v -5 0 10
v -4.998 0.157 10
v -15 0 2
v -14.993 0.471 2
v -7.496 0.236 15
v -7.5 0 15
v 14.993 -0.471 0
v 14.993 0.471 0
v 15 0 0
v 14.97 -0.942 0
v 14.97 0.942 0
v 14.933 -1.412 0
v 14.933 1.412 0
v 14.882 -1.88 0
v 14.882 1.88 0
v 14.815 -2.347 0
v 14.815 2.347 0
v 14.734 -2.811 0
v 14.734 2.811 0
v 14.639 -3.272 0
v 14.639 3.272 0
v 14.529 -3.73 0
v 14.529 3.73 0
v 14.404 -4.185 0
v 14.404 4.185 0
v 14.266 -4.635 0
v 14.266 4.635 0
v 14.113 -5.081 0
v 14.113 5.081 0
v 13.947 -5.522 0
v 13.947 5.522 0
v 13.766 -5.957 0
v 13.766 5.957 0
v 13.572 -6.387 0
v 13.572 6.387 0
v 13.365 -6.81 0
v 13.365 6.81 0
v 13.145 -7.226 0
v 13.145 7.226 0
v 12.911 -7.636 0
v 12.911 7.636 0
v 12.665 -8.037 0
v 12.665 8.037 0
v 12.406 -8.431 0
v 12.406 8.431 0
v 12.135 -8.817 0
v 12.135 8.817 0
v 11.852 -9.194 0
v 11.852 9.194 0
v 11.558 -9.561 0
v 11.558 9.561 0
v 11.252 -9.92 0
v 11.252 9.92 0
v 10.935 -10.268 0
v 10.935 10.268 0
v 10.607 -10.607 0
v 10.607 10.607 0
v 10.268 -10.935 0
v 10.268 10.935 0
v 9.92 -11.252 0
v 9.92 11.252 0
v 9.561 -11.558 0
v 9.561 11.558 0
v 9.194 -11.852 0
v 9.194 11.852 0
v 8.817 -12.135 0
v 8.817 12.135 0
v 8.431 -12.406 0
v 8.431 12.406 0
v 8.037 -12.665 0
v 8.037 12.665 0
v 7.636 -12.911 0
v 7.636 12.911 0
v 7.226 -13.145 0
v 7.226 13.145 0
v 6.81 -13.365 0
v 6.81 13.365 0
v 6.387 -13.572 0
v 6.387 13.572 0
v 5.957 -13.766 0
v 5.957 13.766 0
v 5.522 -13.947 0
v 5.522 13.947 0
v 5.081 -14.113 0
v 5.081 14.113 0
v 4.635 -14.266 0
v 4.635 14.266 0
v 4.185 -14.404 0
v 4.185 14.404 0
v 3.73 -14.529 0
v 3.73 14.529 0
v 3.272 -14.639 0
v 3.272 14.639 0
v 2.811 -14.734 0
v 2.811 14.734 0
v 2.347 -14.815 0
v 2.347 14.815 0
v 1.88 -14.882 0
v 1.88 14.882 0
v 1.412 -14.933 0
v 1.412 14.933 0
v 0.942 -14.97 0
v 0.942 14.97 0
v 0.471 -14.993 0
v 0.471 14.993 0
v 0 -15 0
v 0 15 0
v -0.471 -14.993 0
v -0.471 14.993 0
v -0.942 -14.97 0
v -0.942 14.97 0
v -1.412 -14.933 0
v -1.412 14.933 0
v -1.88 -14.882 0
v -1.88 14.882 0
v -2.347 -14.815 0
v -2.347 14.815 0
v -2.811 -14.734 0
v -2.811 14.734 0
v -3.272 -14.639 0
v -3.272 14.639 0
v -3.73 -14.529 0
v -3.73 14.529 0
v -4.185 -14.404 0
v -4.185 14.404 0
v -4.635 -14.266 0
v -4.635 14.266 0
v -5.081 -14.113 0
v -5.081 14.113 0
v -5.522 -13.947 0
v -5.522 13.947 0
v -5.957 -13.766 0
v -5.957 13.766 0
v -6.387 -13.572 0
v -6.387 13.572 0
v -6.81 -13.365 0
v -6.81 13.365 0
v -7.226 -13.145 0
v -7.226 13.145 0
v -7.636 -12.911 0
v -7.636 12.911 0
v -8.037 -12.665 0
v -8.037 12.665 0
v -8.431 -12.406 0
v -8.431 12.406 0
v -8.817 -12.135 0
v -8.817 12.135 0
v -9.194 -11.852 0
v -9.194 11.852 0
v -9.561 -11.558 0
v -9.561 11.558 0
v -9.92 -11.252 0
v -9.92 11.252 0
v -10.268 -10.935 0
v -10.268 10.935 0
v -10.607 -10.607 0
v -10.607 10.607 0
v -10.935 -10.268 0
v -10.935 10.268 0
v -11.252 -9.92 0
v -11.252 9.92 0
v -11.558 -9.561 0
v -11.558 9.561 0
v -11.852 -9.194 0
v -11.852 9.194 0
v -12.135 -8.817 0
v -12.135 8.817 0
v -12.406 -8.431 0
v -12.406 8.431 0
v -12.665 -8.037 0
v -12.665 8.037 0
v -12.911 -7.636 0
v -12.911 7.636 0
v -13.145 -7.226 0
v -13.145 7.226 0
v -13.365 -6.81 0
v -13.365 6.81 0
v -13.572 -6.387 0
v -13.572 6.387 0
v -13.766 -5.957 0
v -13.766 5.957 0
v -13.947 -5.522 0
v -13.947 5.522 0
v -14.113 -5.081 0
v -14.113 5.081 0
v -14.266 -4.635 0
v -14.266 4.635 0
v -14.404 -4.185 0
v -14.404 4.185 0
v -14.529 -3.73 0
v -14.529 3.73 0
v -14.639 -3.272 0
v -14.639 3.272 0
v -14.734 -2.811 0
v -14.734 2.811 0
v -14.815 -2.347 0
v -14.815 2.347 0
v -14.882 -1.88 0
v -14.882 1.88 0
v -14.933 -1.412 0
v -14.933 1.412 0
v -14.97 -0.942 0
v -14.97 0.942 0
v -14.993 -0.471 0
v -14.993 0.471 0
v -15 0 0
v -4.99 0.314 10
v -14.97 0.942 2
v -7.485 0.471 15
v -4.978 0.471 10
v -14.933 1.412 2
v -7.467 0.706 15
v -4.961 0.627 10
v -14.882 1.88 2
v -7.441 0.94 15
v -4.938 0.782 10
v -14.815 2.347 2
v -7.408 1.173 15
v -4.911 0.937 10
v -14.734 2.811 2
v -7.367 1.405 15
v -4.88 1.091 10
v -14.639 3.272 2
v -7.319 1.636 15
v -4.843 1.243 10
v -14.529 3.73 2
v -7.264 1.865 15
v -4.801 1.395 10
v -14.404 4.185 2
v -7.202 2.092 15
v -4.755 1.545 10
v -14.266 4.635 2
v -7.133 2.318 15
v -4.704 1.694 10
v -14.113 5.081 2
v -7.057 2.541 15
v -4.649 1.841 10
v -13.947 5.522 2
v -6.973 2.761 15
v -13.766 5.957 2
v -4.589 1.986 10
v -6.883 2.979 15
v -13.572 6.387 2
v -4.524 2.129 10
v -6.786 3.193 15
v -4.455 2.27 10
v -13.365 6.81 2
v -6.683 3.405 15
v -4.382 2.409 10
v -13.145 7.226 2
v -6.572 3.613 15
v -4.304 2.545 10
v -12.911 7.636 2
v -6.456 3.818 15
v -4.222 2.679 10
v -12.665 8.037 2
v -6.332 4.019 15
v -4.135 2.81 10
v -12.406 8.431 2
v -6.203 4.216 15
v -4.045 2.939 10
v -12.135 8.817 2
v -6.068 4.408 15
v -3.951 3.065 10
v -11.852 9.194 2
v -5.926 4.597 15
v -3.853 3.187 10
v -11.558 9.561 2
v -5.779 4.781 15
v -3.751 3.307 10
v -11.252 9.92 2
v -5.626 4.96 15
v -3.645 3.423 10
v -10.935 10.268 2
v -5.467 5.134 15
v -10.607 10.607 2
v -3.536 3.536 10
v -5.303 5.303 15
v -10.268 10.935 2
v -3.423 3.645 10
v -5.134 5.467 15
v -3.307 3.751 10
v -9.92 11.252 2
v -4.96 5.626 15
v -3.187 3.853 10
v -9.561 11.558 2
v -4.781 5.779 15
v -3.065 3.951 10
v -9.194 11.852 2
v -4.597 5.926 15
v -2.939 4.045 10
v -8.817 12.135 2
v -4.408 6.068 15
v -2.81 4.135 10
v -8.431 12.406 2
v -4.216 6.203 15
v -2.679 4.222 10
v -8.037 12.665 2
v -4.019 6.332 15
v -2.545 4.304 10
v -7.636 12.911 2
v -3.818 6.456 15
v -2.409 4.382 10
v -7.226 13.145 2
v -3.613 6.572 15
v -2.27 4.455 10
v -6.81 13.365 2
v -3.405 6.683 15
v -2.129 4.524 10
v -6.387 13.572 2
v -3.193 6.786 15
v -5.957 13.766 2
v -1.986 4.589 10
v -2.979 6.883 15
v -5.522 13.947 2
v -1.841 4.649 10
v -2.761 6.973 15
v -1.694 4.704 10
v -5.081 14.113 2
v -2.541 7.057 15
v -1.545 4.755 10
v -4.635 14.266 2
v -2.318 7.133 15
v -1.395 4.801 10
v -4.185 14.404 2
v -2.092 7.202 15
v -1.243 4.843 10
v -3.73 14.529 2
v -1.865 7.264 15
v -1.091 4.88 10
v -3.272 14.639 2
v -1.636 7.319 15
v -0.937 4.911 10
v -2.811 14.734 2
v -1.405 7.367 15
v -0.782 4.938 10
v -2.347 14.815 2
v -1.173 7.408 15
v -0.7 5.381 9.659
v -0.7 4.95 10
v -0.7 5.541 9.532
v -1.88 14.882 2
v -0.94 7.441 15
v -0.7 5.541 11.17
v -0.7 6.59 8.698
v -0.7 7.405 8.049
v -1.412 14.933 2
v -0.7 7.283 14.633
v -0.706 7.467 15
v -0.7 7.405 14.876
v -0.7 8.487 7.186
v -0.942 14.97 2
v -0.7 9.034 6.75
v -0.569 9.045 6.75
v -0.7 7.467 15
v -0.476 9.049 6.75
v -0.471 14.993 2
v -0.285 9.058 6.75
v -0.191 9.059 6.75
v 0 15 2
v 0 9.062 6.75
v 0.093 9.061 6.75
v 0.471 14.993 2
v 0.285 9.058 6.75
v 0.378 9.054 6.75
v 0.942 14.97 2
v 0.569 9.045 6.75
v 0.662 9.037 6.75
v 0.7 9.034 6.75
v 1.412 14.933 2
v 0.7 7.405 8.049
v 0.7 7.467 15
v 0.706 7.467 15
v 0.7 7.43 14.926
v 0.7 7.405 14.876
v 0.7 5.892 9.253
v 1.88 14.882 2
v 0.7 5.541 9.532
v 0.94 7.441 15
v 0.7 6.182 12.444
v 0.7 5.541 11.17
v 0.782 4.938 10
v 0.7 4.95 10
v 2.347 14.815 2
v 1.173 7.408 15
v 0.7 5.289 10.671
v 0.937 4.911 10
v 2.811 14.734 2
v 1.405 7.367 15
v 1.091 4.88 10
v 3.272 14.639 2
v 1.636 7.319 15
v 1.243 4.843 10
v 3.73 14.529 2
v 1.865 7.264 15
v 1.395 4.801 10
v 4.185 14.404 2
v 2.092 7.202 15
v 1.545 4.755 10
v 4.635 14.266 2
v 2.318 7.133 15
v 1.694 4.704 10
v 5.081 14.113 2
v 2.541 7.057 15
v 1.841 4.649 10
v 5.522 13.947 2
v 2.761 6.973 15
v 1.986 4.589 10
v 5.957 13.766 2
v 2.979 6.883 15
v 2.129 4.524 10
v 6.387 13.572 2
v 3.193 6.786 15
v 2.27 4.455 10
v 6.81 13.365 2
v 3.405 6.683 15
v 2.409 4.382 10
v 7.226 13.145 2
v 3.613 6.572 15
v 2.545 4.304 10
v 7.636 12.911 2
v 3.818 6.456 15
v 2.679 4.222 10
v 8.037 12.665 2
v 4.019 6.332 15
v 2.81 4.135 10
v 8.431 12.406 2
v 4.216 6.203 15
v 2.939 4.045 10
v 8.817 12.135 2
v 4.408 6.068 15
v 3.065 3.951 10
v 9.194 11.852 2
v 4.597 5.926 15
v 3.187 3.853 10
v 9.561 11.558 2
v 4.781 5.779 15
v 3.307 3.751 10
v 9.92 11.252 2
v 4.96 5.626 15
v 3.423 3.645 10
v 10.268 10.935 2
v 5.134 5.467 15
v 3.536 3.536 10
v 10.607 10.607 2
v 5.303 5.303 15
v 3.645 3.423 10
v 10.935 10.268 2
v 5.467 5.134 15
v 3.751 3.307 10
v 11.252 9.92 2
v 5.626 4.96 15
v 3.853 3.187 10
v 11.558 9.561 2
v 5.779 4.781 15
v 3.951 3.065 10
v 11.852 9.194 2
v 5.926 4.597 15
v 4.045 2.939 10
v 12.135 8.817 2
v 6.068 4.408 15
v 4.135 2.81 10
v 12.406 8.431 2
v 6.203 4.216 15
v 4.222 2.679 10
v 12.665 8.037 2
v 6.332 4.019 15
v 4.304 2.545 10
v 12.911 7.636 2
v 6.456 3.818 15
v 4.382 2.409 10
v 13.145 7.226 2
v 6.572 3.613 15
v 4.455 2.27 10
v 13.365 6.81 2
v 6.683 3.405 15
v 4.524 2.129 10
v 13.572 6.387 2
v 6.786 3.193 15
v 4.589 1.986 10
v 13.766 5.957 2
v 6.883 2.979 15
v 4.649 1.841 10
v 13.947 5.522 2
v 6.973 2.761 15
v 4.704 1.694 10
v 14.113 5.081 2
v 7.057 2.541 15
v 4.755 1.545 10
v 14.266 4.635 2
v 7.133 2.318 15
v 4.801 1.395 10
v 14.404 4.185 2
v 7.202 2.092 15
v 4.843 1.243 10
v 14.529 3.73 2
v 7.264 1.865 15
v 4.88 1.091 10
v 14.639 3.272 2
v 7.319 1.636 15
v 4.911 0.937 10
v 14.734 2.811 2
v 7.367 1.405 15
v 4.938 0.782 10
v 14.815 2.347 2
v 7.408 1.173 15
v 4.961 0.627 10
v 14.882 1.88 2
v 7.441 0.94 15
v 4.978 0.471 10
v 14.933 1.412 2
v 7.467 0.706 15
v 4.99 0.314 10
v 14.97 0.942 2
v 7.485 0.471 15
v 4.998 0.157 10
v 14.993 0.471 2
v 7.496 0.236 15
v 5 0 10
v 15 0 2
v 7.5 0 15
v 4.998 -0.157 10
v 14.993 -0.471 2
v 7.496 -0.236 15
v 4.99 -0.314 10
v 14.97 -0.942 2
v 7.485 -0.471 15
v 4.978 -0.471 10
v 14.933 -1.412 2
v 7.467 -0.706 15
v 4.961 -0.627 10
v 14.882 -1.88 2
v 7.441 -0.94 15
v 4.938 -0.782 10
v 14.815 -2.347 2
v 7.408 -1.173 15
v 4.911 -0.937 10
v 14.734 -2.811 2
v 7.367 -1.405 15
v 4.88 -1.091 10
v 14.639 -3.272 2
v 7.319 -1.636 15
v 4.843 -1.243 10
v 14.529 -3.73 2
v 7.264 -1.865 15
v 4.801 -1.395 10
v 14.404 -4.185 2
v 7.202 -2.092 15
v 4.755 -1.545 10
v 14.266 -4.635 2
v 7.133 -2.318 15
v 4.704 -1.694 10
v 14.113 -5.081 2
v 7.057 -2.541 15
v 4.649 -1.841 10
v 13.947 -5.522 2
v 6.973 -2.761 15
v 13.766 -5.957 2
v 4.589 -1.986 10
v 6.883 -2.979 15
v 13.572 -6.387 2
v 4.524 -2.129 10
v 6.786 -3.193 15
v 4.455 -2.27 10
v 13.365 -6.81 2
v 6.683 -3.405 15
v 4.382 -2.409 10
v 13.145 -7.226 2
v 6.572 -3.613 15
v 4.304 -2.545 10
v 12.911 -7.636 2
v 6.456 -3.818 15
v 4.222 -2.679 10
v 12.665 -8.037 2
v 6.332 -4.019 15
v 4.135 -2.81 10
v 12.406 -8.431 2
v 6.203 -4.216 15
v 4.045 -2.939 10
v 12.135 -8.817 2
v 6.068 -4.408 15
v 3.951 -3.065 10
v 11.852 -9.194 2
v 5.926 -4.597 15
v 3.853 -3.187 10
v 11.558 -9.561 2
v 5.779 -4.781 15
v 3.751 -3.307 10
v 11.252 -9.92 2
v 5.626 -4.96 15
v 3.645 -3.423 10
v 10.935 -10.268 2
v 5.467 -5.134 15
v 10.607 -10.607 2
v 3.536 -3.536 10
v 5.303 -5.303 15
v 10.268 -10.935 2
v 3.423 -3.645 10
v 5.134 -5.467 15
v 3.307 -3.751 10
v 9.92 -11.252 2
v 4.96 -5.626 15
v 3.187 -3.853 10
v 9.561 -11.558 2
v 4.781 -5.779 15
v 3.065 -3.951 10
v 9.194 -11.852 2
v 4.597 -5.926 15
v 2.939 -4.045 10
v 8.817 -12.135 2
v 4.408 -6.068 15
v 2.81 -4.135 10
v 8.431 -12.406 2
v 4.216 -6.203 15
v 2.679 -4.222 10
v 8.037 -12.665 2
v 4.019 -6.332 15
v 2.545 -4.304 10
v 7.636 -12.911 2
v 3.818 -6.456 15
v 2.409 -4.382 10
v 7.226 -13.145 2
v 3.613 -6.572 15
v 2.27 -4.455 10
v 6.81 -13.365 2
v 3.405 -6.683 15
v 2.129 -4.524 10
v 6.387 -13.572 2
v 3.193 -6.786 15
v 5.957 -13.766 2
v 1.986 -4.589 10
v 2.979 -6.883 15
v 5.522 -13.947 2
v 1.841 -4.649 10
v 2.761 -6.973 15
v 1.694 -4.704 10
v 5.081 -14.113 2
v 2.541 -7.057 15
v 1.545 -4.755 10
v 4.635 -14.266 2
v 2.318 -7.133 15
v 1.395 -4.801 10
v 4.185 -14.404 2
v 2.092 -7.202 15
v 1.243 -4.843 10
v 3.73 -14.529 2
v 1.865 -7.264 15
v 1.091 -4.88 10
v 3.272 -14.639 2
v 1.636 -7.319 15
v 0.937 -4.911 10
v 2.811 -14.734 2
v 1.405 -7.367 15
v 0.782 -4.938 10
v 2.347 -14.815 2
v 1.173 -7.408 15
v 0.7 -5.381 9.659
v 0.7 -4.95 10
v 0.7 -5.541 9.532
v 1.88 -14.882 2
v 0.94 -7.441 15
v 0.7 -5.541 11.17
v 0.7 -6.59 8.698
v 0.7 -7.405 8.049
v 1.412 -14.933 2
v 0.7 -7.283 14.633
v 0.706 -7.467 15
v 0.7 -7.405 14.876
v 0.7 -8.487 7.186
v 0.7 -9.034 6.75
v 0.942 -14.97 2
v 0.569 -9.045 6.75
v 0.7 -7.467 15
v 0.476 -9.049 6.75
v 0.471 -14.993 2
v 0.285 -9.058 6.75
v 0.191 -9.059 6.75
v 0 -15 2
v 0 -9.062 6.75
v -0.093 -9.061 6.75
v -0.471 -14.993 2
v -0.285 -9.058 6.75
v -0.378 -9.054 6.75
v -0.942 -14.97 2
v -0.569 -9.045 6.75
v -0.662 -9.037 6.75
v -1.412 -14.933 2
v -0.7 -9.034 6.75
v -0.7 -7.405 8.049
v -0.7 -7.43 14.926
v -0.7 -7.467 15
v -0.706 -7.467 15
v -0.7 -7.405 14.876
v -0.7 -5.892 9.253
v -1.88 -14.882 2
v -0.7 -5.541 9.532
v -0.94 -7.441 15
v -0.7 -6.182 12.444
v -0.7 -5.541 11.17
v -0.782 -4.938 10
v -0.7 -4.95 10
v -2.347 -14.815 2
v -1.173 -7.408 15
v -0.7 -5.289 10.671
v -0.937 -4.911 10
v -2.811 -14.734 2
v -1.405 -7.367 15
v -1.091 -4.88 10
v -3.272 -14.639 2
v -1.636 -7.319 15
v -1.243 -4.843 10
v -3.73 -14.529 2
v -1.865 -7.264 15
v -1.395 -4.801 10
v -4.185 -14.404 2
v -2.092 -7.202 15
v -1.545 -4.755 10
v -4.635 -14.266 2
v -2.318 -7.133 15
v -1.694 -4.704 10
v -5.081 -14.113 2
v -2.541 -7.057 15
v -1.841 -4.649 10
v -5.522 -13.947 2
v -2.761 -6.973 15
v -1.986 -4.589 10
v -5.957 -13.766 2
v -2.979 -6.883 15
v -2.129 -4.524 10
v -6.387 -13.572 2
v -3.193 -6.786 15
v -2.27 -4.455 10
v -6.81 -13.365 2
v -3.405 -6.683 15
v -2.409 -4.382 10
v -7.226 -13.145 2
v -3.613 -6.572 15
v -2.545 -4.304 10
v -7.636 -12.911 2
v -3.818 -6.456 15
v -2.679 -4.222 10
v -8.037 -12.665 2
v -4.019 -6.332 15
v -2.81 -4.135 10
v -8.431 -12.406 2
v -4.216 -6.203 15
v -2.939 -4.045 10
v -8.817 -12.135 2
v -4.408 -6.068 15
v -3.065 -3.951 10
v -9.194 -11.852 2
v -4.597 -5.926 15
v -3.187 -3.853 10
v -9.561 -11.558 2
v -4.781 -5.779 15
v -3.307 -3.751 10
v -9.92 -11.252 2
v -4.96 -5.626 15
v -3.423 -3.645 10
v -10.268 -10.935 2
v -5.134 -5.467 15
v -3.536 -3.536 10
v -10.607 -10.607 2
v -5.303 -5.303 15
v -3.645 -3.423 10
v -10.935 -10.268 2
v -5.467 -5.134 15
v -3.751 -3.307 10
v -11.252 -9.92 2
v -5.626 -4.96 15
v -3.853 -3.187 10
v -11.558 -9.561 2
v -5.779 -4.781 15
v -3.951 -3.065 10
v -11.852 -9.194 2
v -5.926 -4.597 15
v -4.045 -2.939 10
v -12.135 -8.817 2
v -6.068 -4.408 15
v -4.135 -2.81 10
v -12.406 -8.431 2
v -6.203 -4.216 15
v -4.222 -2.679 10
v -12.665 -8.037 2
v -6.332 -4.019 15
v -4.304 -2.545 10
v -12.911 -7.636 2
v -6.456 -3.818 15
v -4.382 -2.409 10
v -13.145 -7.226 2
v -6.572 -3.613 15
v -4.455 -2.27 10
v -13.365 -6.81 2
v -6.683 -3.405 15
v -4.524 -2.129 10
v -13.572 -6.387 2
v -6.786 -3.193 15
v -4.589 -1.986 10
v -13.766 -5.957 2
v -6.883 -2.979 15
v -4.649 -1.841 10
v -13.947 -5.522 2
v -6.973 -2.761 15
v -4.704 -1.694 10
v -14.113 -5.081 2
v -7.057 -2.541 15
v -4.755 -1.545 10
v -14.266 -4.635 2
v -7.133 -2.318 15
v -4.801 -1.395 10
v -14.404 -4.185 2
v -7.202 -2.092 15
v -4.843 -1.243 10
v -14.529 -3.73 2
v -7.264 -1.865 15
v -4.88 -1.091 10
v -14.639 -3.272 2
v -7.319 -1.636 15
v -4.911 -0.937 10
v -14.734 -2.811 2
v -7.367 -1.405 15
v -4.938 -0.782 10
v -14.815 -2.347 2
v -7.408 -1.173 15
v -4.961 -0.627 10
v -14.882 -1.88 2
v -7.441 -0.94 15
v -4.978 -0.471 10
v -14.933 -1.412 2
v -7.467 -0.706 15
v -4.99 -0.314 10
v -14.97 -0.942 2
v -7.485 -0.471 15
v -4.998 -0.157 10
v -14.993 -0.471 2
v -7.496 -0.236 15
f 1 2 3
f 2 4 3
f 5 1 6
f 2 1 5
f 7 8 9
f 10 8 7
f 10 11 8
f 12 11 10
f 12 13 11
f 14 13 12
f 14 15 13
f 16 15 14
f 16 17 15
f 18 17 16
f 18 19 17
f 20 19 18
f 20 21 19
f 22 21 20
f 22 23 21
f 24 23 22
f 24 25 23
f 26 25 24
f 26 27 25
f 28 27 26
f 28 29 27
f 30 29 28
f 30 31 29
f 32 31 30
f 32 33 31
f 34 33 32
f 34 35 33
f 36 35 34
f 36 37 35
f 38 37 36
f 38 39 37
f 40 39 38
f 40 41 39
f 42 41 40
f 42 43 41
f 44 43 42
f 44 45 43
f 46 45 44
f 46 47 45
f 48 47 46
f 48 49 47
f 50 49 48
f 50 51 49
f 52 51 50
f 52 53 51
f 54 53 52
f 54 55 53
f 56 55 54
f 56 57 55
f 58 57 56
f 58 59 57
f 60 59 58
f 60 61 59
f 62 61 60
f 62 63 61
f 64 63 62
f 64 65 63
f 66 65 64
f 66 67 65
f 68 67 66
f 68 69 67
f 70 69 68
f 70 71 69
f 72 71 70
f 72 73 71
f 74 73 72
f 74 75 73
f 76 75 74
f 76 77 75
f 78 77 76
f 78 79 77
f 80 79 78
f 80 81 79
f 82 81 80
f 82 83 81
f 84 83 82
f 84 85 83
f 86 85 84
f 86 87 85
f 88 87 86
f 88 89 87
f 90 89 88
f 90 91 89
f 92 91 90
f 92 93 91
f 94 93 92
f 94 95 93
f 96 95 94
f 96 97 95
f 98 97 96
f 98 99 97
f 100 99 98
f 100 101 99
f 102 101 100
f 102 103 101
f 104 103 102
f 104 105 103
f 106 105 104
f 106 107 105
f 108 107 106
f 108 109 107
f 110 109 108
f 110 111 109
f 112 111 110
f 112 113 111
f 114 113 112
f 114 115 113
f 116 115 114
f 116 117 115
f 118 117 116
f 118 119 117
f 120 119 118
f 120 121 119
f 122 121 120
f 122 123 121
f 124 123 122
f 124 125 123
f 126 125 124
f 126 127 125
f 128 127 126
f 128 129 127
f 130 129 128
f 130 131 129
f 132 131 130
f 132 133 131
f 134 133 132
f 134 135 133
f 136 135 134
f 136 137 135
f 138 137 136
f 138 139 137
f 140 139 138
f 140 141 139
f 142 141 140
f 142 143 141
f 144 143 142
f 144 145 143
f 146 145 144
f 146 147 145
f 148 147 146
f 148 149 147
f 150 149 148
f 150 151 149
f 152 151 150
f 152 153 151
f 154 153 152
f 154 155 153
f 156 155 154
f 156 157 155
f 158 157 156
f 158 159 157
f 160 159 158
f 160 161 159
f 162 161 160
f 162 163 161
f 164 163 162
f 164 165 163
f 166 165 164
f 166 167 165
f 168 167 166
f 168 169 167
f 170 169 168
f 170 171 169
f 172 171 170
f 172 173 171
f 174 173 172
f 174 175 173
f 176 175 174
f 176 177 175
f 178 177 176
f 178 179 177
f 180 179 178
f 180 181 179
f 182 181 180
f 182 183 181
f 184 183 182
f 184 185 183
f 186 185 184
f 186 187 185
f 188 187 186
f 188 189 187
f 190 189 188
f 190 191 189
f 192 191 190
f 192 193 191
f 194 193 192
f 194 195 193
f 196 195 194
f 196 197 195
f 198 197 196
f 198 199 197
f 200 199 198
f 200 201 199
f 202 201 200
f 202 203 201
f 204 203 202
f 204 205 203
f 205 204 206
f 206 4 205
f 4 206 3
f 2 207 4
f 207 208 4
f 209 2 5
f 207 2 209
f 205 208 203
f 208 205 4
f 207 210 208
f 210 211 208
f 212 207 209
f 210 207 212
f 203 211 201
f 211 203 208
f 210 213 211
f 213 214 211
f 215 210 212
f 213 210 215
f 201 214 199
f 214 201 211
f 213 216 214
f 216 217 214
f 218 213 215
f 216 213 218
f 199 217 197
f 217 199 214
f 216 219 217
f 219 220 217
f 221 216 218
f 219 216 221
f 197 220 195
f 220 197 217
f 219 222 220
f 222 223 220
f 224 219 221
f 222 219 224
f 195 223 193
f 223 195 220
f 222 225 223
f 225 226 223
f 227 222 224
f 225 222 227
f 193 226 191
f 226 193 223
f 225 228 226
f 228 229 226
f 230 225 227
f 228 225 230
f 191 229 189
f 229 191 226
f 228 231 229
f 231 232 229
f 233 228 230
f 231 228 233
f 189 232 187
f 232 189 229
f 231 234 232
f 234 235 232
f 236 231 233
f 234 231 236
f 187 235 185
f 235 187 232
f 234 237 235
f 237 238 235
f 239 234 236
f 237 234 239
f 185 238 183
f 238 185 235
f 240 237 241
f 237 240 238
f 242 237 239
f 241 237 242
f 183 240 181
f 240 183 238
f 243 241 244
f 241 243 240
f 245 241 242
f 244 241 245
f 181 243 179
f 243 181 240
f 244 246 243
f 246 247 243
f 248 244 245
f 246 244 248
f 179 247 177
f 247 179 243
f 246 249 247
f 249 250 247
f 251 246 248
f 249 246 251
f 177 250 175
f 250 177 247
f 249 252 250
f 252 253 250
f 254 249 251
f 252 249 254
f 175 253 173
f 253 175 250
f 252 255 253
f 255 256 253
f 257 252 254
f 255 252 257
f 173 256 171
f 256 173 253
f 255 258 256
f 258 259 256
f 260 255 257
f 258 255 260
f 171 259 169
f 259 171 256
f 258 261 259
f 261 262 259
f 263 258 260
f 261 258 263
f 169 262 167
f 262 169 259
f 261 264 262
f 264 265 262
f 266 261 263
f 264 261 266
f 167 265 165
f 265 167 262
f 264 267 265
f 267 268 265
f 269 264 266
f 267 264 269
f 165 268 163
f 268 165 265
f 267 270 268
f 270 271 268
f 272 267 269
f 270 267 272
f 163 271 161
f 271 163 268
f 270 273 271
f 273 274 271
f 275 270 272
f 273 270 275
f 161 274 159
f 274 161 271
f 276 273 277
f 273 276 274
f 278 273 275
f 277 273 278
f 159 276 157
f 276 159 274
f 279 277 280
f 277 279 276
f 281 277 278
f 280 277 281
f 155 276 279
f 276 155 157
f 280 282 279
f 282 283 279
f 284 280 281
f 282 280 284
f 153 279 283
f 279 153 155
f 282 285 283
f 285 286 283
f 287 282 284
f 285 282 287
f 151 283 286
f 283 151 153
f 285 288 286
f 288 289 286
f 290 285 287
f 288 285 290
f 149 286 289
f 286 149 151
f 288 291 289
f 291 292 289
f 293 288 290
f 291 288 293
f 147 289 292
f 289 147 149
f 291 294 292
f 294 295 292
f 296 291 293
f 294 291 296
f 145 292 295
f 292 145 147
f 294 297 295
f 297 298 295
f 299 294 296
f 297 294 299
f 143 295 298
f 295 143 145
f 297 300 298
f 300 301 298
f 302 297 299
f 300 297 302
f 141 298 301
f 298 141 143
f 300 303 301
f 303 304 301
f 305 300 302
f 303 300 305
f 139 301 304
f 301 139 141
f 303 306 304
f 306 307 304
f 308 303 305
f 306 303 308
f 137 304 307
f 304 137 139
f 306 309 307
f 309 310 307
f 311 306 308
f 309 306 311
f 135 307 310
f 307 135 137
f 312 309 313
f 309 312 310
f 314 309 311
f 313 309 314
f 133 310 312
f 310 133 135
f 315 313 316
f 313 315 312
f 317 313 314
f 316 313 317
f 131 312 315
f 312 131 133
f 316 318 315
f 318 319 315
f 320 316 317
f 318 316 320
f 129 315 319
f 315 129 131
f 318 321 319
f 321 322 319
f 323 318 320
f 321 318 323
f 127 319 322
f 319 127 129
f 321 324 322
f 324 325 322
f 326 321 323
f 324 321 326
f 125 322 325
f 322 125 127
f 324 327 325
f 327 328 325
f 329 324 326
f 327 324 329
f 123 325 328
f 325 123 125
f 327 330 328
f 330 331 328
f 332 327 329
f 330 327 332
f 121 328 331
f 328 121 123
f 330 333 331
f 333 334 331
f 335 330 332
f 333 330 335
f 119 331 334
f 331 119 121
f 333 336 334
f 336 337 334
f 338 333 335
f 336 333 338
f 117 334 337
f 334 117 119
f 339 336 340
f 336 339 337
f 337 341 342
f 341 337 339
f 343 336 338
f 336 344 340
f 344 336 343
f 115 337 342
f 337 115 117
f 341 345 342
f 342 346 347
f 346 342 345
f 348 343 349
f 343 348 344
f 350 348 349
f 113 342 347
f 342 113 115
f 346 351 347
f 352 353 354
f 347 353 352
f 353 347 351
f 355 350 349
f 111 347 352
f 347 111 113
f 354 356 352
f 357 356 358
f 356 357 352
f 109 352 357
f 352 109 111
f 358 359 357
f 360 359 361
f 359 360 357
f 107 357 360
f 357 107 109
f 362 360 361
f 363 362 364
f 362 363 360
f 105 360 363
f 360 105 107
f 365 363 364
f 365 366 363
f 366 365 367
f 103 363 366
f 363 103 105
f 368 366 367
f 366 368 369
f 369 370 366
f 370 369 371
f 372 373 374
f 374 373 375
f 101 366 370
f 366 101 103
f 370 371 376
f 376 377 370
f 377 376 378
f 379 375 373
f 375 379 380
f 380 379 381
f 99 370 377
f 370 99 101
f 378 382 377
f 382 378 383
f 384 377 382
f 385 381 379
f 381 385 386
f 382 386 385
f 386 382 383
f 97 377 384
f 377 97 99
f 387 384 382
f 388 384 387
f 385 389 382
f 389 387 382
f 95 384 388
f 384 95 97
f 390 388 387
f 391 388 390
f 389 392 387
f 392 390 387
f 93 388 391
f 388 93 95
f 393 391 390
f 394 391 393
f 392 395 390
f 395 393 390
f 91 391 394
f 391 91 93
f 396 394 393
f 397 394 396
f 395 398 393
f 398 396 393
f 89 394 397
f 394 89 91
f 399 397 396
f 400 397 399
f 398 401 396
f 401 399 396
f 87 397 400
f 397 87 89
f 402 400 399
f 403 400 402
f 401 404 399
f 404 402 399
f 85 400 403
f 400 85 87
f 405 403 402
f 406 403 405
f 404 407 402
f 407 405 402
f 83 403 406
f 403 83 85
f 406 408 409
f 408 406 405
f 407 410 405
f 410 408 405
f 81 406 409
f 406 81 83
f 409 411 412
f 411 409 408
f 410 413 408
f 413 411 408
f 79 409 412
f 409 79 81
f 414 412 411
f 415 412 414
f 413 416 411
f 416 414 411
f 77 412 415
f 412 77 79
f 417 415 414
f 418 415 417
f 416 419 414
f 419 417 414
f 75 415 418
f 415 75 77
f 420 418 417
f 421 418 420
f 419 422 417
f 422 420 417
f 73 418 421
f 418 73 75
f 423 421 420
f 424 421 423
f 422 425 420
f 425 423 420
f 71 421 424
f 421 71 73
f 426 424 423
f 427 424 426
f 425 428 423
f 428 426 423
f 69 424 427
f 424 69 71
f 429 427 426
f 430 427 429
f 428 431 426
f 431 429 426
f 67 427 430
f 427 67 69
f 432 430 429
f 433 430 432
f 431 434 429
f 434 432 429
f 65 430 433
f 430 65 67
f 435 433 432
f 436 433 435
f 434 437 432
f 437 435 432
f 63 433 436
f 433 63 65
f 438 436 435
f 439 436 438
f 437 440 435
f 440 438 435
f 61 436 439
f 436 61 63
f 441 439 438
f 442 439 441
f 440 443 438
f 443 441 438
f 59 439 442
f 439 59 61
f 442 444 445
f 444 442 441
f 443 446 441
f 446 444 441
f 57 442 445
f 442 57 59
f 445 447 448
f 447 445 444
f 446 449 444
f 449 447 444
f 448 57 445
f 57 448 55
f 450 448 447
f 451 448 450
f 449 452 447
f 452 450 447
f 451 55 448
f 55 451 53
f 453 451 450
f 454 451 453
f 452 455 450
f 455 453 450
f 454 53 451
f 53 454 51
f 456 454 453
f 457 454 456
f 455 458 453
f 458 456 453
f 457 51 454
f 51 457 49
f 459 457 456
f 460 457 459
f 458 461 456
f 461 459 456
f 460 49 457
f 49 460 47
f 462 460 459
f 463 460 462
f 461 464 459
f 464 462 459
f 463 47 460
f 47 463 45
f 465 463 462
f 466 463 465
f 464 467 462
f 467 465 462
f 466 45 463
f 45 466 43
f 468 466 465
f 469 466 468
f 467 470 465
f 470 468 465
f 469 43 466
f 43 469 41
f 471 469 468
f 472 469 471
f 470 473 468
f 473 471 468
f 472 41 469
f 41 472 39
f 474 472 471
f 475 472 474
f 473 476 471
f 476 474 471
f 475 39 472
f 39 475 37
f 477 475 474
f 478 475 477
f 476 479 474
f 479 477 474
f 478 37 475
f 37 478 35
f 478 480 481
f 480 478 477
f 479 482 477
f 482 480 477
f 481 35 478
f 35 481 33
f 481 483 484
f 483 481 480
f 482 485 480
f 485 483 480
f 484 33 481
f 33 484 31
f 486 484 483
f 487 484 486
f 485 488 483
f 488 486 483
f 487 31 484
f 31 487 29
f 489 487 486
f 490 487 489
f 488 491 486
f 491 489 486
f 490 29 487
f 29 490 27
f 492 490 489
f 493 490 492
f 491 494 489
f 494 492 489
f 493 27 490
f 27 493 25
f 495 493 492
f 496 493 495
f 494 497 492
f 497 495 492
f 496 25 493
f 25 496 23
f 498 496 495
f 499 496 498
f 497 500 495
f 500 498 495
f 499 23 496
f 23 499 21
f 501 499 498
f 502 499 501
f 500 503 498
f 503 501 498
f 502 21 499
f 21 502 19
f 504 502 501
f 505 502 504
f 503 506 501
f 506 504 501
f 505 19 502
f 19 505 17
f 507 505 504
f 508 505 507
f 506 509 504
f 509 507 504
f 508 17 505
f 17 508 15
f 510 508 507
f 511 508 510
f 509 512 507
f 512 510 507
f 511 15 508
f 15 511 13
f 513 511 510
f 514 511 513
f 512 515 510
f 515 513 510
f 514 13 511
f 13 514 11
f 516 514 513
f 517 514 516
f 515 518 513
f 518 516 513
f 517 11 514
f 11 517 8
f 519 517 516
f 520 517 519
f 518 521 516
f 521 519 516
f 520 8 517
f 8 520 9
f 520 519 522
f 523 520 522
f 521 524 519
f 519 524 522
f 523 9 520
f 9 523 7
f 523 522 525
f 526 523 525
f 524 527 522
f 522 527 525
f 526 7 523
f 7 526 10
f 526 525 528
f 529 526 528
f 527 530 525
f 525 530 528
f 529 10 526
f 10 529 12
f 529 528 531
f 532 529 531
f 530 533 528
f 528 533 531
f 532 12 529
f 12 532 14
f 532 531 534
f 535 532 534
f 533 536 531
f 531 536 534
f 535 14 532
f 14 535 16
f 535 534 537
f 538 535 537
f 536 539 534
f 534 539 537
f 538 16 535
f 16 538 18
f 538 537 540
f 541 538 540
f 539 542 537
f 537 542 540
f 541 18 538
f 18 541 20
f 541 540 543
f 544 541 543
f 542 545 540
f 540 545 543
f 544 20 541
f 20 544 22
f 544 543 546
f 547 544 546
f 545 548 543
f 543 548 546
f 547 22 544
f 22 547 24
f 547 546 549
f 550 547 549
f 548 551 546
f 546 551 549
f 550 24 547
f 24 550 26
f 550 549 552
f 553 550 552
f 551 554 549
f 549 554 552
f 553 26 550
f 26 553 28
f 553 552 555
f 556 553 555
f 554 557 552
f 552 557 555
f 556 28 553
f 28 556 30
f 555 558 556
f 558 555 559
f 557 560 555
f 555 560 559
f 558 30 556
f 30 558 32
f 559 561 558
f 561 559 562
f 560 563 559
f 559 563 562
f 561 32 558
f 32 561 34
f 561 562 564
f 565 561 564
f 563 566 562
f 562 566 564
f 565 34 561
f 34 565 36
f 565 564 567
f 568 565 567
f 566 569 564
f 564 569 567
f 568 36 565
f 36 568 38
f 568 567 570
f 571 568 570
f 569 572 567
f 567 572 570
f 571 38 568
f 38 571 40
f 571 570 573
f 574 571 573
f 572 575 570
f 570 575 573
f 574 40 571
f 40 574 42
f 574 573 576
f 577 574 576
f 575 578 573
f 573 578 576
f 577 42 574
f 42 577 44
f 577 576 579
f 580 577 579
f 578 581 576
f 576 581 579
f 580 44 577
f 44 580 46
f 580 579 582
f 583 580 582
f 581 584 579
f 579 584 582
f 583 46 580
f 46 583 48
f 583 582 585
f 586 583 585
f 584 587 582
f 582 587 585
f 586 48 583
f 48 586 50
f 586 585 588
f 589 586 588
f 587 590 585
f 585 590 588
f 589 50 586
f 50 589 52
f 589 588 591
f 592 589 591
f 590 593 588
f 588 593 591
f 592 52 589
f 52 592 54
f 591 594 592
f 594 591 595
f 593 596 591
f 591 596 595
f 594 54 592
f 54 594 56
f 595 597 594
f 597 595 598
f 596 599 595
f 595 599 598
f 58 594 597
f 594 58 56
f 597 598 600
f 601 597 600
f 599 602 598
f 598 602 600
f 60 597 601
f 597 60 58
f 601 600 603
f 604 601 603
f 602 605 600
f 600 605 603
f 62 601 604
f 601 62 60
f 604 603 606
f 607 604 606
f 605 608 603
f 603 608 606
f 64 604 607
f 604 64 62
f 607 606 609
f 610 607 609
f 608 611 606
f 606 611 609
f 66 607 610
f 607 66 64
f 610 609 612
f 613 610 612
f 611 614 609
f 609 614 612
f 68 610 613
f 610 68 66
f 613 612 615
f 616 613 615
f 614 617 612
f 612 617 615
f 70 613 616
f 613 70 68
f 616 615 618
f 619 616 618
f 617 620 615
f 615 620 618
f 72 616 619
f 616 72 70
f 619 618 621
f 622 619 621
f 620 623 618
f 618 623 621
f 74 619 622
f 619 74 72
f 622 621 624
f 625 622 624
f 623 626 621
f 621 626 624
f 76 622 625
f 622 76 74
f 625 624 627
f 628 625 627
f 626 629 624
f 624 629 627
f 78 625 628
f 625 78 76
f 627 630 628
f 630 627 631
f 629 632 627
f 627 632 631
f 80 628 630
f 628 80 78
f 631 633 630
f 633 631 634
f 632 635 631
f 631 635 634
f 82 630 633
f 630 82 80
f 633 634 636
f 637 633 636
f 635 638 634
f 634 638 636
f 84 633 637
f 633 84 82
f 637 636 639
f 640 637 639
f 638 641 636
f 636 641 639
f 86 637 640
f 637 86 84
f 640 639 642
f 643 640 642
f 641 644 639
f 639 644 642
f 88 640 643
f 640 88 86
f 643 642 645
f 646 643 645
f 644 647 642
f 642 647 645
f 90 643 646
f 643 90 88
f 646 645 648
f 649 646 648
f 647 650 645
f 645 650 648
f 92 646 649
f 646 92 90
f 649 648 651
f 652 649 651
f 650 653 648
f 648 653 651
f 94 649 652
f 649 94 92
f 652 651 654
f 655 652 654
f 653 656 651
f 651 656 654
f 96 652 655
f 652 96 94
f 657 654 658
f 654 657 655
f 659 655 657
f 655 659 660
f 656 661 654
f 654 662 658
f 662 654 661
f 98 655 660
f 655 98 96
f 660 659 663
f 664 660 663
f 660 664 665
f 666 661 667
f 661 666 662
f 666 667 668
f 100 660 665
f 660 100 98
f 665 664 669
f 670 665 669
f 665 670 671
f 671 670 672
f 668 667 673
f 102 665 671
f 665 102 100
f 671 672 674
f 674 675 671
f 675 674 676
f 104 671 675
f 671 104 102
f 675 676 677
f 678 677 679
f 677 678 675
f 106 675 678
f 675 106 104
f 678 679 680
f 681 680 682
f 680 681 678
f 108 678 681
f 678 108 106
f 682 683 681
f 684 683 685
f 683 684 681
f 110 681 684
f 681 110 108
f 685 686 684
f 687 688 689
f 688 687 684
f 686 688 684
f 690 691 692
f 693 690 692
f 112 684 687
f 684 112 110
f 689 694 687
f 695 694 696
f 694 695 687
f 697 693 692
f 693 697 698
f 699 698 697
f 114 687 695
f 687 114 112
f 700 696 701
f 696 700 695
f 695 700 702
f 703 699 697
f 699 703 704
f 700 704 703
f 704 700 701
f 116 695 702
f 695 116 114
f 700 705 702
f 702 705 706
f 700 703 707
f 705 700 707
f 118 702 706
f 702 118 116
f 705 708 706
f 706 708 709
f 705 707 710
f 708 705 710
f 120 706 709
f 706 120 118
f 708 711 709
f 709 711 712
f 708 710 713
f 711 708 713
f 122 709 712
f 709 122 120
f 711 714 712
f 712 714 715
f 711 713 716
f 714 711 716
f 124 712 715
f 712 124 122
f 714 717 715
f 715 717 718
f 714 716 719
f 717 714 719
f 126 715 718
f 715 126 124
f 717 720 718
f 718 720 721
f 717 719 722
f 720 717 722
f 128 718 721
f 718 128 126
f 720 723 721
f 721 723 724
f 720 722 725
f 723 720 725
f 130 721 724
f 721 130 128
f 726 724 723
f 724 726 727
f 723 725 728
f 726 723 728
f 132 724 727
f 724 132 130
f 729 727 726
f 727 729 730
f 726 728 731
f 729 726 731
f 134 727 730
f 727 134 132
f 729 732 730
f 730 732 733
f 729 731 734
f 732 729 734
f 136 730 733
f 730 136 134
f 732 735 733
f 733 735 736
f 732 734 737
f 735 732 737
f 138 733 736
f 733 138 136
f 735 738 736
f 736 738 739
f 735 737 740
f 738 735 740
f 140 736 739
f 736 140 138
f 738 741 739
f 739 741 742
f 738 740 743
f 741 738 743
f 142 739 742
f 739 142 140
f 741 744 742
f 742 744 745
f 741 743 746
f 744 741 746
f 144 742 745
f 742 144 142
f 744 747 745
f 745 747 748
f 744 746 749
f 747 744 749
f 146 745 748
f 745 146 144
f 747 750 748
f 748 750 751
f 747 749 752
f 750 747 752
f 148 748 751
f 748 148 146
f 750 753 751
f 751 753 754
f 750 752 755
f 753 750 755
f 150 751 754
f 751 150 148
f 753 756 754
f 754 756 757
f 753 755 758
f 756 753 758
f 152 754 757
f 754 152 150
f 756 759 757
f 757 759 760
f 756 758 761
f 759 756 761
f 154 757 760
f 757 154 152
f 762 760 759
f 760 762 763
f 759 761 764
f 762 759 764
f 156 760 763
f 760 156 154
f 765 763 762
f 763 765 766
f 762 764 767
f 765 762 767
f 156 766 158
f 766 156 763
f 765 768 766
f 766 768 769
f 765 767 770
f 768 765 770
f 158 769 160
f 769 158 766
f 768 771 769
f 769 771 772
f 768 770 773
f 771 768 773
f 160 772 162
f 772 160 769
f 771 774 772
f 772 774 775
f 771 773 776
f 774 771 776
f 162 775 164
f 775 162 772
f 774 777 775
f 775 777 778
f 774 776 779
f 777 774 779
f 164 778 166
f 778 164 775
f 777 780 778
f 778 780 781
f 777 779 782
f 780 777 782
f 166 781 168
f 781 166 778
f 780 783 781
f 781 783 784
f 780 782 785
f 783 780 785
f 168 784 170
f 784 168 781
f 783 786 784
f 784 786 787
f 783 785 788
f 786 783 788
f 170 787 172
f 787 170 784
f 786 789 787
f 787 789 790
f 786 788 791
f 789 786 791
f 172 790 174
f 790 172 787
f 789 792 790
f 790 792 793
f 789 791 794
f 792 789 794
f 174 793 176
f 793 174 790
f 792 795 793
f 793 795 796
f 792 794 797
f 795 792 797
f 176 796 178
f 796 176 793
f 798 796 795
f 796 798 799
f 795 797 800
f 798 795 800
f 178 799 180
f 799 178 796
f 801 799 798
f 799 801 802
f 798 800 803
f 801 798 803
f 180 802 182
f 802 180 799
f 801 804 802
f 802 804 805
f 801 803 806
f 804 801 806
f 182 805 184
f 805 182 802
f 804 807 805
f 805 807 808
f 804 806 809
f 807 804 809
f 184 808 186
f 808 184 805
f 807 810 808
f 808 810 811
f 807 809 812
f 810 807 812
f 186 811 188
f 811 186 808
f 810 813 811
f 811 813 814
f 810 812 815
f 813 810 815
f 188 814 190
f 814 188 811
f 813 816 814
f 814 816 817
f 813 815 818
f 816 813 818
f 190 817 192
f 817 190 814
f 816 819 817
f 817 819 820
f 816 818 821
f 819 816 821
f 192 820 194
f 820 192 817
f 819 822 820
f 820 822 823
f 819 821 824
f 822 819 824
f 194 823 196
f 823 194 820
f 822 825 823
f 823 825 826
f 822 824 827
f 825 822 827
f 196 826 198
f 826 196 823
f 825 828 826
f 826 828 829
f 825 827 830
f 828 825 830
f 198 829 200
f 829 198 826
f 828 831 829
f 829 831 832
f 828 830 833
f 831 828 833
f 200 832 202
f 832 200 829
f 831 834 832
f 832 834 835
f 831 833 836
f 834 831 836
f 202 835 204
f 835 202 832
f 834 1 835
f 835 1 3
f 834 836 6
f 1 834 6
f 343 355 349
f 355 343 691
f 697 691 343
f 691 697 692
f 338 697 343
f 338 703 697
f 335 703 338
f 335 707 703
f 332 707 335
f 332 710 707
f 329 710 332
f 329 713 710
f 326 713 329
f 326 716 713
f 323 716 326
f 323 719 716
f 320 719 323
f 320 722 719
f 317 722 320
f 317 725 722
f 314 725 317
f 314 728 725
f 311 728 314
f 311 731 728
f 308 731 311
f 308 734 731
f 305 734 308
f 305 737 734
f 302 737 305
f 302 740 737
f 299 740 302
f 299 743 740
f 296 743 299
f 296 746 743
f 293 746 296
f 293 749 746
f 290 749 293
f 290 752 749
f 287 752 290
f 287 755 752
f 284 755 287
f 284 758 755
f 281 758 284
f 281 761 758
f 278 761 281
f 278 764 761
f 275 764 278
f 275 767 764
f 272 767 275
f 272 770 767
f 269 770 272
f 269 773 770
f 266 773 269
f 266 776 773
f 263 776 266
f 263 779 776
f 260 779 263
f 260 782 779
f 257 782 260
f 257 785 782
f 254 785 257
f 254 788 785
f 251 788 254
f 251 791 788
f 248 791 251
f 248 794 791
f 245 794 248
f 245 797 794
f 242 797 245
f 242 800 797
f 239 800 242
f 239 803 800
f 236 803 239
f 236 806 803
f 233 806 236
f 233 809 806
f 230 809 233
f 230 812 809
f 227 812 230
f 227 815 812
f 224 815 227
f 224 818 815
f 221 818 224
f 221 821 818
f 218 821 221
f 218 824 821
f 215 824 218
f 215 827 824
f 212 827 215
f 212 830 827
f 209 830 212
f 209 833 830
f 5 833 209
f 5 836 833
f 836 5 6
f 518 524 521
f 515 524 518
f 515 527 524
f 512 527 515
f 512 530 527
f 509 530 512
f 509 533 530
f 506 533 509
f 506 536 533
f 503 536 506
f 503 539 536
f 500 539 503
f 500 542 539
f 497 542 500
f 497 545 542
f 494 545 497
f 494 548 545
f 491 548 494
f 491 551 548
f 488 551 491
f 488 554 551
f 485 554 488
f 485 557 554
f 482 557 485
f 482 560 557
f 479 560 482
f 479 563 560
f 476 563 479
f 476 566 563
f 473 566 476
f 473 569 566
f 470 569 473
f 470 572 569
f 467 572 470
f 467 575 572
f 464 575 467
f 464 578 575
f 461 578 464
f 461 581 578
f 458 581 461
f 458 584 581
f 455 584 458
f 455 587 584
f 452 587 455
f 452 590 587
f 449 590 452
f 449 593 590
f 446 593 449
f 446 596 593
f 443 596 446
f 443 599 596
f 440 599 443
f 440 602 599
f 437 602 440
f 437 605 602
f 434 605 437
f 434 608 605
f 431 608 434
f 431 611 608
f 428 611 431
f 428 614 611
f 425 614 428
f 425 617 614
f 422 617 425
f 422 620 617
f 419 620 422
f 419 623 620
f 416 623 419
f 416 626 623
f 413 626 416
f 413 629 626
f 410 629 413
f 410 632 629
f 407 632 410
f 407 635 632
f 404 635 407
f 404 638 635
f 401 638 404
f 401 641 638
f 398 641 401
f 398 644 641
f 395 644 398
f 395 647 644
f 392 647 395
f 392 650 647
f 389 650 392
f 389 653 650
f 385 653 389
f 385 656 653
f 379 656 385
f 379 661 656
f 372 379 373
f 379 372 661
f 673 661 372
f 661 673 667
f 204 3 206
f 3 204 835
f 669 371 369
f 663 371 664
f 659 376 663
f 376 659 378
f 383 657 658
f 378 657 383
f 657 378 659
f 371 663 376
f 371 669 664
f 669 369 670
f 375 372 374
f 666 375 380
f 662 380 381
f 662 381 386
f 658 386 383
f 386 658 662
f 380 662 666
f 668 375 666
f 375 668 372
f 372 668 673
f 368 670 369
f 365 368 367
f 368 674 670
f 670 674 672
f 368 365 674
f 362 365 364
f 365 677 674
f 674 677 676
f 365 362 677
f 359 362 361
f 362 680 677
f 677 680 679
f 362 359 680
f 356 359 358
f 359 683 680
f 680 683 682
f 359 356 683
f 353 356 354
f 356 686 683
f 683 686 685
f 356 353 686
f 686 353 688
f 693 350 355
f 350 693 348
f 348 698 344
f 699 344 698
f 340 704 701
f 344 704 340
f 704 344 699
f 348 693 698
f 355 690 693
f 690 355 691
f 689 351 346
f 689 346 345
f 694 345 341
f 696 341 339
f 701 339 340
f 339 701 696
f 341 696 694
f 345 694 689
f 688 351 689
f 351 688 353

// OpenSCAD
basesize=30; //mm
baseheight=15; //mm
cardthickness=1.4; //mm
curvedslit=0;

middlesize=basesize/3;
topsize=basesize/2;
edgeheight=basesize/15; //mm
slopeheight=baseheight-edgeheight;
slitelevation=baseheight*0.45;

module cardspace (height=10, radius=10, thickness=0.3) {
    difference () {
        cylinder(h=height, r=radius, center=true, $fn=200);
        cylinder(h=height, r=radius-thickness, center=true, $fn=200);
    }
}
    

difference () {
    rotate_extrude($fn=200) 
    polygon( points=[
                [0,0], 
                [basesize/2,0], 
                [basesize/2,edgeheight],
                [middlesize/2,baseheight*2/3],
                [topsize/2,baseheight],
                [0,baseheight]
    ] );
    if (curvedslit) {
        translate([-cardthickness+2*basesize,0,slitelevation+baseheight/2]) cardspace (height=baseheight, radius=2*basesize, thickness=cardthickness);       
    }
    else {
        translate([0,0,slitelevation+baseheight/2]) cube([cardthickness,basesize, baseheight], center=true);
    }
    
    
}
    
